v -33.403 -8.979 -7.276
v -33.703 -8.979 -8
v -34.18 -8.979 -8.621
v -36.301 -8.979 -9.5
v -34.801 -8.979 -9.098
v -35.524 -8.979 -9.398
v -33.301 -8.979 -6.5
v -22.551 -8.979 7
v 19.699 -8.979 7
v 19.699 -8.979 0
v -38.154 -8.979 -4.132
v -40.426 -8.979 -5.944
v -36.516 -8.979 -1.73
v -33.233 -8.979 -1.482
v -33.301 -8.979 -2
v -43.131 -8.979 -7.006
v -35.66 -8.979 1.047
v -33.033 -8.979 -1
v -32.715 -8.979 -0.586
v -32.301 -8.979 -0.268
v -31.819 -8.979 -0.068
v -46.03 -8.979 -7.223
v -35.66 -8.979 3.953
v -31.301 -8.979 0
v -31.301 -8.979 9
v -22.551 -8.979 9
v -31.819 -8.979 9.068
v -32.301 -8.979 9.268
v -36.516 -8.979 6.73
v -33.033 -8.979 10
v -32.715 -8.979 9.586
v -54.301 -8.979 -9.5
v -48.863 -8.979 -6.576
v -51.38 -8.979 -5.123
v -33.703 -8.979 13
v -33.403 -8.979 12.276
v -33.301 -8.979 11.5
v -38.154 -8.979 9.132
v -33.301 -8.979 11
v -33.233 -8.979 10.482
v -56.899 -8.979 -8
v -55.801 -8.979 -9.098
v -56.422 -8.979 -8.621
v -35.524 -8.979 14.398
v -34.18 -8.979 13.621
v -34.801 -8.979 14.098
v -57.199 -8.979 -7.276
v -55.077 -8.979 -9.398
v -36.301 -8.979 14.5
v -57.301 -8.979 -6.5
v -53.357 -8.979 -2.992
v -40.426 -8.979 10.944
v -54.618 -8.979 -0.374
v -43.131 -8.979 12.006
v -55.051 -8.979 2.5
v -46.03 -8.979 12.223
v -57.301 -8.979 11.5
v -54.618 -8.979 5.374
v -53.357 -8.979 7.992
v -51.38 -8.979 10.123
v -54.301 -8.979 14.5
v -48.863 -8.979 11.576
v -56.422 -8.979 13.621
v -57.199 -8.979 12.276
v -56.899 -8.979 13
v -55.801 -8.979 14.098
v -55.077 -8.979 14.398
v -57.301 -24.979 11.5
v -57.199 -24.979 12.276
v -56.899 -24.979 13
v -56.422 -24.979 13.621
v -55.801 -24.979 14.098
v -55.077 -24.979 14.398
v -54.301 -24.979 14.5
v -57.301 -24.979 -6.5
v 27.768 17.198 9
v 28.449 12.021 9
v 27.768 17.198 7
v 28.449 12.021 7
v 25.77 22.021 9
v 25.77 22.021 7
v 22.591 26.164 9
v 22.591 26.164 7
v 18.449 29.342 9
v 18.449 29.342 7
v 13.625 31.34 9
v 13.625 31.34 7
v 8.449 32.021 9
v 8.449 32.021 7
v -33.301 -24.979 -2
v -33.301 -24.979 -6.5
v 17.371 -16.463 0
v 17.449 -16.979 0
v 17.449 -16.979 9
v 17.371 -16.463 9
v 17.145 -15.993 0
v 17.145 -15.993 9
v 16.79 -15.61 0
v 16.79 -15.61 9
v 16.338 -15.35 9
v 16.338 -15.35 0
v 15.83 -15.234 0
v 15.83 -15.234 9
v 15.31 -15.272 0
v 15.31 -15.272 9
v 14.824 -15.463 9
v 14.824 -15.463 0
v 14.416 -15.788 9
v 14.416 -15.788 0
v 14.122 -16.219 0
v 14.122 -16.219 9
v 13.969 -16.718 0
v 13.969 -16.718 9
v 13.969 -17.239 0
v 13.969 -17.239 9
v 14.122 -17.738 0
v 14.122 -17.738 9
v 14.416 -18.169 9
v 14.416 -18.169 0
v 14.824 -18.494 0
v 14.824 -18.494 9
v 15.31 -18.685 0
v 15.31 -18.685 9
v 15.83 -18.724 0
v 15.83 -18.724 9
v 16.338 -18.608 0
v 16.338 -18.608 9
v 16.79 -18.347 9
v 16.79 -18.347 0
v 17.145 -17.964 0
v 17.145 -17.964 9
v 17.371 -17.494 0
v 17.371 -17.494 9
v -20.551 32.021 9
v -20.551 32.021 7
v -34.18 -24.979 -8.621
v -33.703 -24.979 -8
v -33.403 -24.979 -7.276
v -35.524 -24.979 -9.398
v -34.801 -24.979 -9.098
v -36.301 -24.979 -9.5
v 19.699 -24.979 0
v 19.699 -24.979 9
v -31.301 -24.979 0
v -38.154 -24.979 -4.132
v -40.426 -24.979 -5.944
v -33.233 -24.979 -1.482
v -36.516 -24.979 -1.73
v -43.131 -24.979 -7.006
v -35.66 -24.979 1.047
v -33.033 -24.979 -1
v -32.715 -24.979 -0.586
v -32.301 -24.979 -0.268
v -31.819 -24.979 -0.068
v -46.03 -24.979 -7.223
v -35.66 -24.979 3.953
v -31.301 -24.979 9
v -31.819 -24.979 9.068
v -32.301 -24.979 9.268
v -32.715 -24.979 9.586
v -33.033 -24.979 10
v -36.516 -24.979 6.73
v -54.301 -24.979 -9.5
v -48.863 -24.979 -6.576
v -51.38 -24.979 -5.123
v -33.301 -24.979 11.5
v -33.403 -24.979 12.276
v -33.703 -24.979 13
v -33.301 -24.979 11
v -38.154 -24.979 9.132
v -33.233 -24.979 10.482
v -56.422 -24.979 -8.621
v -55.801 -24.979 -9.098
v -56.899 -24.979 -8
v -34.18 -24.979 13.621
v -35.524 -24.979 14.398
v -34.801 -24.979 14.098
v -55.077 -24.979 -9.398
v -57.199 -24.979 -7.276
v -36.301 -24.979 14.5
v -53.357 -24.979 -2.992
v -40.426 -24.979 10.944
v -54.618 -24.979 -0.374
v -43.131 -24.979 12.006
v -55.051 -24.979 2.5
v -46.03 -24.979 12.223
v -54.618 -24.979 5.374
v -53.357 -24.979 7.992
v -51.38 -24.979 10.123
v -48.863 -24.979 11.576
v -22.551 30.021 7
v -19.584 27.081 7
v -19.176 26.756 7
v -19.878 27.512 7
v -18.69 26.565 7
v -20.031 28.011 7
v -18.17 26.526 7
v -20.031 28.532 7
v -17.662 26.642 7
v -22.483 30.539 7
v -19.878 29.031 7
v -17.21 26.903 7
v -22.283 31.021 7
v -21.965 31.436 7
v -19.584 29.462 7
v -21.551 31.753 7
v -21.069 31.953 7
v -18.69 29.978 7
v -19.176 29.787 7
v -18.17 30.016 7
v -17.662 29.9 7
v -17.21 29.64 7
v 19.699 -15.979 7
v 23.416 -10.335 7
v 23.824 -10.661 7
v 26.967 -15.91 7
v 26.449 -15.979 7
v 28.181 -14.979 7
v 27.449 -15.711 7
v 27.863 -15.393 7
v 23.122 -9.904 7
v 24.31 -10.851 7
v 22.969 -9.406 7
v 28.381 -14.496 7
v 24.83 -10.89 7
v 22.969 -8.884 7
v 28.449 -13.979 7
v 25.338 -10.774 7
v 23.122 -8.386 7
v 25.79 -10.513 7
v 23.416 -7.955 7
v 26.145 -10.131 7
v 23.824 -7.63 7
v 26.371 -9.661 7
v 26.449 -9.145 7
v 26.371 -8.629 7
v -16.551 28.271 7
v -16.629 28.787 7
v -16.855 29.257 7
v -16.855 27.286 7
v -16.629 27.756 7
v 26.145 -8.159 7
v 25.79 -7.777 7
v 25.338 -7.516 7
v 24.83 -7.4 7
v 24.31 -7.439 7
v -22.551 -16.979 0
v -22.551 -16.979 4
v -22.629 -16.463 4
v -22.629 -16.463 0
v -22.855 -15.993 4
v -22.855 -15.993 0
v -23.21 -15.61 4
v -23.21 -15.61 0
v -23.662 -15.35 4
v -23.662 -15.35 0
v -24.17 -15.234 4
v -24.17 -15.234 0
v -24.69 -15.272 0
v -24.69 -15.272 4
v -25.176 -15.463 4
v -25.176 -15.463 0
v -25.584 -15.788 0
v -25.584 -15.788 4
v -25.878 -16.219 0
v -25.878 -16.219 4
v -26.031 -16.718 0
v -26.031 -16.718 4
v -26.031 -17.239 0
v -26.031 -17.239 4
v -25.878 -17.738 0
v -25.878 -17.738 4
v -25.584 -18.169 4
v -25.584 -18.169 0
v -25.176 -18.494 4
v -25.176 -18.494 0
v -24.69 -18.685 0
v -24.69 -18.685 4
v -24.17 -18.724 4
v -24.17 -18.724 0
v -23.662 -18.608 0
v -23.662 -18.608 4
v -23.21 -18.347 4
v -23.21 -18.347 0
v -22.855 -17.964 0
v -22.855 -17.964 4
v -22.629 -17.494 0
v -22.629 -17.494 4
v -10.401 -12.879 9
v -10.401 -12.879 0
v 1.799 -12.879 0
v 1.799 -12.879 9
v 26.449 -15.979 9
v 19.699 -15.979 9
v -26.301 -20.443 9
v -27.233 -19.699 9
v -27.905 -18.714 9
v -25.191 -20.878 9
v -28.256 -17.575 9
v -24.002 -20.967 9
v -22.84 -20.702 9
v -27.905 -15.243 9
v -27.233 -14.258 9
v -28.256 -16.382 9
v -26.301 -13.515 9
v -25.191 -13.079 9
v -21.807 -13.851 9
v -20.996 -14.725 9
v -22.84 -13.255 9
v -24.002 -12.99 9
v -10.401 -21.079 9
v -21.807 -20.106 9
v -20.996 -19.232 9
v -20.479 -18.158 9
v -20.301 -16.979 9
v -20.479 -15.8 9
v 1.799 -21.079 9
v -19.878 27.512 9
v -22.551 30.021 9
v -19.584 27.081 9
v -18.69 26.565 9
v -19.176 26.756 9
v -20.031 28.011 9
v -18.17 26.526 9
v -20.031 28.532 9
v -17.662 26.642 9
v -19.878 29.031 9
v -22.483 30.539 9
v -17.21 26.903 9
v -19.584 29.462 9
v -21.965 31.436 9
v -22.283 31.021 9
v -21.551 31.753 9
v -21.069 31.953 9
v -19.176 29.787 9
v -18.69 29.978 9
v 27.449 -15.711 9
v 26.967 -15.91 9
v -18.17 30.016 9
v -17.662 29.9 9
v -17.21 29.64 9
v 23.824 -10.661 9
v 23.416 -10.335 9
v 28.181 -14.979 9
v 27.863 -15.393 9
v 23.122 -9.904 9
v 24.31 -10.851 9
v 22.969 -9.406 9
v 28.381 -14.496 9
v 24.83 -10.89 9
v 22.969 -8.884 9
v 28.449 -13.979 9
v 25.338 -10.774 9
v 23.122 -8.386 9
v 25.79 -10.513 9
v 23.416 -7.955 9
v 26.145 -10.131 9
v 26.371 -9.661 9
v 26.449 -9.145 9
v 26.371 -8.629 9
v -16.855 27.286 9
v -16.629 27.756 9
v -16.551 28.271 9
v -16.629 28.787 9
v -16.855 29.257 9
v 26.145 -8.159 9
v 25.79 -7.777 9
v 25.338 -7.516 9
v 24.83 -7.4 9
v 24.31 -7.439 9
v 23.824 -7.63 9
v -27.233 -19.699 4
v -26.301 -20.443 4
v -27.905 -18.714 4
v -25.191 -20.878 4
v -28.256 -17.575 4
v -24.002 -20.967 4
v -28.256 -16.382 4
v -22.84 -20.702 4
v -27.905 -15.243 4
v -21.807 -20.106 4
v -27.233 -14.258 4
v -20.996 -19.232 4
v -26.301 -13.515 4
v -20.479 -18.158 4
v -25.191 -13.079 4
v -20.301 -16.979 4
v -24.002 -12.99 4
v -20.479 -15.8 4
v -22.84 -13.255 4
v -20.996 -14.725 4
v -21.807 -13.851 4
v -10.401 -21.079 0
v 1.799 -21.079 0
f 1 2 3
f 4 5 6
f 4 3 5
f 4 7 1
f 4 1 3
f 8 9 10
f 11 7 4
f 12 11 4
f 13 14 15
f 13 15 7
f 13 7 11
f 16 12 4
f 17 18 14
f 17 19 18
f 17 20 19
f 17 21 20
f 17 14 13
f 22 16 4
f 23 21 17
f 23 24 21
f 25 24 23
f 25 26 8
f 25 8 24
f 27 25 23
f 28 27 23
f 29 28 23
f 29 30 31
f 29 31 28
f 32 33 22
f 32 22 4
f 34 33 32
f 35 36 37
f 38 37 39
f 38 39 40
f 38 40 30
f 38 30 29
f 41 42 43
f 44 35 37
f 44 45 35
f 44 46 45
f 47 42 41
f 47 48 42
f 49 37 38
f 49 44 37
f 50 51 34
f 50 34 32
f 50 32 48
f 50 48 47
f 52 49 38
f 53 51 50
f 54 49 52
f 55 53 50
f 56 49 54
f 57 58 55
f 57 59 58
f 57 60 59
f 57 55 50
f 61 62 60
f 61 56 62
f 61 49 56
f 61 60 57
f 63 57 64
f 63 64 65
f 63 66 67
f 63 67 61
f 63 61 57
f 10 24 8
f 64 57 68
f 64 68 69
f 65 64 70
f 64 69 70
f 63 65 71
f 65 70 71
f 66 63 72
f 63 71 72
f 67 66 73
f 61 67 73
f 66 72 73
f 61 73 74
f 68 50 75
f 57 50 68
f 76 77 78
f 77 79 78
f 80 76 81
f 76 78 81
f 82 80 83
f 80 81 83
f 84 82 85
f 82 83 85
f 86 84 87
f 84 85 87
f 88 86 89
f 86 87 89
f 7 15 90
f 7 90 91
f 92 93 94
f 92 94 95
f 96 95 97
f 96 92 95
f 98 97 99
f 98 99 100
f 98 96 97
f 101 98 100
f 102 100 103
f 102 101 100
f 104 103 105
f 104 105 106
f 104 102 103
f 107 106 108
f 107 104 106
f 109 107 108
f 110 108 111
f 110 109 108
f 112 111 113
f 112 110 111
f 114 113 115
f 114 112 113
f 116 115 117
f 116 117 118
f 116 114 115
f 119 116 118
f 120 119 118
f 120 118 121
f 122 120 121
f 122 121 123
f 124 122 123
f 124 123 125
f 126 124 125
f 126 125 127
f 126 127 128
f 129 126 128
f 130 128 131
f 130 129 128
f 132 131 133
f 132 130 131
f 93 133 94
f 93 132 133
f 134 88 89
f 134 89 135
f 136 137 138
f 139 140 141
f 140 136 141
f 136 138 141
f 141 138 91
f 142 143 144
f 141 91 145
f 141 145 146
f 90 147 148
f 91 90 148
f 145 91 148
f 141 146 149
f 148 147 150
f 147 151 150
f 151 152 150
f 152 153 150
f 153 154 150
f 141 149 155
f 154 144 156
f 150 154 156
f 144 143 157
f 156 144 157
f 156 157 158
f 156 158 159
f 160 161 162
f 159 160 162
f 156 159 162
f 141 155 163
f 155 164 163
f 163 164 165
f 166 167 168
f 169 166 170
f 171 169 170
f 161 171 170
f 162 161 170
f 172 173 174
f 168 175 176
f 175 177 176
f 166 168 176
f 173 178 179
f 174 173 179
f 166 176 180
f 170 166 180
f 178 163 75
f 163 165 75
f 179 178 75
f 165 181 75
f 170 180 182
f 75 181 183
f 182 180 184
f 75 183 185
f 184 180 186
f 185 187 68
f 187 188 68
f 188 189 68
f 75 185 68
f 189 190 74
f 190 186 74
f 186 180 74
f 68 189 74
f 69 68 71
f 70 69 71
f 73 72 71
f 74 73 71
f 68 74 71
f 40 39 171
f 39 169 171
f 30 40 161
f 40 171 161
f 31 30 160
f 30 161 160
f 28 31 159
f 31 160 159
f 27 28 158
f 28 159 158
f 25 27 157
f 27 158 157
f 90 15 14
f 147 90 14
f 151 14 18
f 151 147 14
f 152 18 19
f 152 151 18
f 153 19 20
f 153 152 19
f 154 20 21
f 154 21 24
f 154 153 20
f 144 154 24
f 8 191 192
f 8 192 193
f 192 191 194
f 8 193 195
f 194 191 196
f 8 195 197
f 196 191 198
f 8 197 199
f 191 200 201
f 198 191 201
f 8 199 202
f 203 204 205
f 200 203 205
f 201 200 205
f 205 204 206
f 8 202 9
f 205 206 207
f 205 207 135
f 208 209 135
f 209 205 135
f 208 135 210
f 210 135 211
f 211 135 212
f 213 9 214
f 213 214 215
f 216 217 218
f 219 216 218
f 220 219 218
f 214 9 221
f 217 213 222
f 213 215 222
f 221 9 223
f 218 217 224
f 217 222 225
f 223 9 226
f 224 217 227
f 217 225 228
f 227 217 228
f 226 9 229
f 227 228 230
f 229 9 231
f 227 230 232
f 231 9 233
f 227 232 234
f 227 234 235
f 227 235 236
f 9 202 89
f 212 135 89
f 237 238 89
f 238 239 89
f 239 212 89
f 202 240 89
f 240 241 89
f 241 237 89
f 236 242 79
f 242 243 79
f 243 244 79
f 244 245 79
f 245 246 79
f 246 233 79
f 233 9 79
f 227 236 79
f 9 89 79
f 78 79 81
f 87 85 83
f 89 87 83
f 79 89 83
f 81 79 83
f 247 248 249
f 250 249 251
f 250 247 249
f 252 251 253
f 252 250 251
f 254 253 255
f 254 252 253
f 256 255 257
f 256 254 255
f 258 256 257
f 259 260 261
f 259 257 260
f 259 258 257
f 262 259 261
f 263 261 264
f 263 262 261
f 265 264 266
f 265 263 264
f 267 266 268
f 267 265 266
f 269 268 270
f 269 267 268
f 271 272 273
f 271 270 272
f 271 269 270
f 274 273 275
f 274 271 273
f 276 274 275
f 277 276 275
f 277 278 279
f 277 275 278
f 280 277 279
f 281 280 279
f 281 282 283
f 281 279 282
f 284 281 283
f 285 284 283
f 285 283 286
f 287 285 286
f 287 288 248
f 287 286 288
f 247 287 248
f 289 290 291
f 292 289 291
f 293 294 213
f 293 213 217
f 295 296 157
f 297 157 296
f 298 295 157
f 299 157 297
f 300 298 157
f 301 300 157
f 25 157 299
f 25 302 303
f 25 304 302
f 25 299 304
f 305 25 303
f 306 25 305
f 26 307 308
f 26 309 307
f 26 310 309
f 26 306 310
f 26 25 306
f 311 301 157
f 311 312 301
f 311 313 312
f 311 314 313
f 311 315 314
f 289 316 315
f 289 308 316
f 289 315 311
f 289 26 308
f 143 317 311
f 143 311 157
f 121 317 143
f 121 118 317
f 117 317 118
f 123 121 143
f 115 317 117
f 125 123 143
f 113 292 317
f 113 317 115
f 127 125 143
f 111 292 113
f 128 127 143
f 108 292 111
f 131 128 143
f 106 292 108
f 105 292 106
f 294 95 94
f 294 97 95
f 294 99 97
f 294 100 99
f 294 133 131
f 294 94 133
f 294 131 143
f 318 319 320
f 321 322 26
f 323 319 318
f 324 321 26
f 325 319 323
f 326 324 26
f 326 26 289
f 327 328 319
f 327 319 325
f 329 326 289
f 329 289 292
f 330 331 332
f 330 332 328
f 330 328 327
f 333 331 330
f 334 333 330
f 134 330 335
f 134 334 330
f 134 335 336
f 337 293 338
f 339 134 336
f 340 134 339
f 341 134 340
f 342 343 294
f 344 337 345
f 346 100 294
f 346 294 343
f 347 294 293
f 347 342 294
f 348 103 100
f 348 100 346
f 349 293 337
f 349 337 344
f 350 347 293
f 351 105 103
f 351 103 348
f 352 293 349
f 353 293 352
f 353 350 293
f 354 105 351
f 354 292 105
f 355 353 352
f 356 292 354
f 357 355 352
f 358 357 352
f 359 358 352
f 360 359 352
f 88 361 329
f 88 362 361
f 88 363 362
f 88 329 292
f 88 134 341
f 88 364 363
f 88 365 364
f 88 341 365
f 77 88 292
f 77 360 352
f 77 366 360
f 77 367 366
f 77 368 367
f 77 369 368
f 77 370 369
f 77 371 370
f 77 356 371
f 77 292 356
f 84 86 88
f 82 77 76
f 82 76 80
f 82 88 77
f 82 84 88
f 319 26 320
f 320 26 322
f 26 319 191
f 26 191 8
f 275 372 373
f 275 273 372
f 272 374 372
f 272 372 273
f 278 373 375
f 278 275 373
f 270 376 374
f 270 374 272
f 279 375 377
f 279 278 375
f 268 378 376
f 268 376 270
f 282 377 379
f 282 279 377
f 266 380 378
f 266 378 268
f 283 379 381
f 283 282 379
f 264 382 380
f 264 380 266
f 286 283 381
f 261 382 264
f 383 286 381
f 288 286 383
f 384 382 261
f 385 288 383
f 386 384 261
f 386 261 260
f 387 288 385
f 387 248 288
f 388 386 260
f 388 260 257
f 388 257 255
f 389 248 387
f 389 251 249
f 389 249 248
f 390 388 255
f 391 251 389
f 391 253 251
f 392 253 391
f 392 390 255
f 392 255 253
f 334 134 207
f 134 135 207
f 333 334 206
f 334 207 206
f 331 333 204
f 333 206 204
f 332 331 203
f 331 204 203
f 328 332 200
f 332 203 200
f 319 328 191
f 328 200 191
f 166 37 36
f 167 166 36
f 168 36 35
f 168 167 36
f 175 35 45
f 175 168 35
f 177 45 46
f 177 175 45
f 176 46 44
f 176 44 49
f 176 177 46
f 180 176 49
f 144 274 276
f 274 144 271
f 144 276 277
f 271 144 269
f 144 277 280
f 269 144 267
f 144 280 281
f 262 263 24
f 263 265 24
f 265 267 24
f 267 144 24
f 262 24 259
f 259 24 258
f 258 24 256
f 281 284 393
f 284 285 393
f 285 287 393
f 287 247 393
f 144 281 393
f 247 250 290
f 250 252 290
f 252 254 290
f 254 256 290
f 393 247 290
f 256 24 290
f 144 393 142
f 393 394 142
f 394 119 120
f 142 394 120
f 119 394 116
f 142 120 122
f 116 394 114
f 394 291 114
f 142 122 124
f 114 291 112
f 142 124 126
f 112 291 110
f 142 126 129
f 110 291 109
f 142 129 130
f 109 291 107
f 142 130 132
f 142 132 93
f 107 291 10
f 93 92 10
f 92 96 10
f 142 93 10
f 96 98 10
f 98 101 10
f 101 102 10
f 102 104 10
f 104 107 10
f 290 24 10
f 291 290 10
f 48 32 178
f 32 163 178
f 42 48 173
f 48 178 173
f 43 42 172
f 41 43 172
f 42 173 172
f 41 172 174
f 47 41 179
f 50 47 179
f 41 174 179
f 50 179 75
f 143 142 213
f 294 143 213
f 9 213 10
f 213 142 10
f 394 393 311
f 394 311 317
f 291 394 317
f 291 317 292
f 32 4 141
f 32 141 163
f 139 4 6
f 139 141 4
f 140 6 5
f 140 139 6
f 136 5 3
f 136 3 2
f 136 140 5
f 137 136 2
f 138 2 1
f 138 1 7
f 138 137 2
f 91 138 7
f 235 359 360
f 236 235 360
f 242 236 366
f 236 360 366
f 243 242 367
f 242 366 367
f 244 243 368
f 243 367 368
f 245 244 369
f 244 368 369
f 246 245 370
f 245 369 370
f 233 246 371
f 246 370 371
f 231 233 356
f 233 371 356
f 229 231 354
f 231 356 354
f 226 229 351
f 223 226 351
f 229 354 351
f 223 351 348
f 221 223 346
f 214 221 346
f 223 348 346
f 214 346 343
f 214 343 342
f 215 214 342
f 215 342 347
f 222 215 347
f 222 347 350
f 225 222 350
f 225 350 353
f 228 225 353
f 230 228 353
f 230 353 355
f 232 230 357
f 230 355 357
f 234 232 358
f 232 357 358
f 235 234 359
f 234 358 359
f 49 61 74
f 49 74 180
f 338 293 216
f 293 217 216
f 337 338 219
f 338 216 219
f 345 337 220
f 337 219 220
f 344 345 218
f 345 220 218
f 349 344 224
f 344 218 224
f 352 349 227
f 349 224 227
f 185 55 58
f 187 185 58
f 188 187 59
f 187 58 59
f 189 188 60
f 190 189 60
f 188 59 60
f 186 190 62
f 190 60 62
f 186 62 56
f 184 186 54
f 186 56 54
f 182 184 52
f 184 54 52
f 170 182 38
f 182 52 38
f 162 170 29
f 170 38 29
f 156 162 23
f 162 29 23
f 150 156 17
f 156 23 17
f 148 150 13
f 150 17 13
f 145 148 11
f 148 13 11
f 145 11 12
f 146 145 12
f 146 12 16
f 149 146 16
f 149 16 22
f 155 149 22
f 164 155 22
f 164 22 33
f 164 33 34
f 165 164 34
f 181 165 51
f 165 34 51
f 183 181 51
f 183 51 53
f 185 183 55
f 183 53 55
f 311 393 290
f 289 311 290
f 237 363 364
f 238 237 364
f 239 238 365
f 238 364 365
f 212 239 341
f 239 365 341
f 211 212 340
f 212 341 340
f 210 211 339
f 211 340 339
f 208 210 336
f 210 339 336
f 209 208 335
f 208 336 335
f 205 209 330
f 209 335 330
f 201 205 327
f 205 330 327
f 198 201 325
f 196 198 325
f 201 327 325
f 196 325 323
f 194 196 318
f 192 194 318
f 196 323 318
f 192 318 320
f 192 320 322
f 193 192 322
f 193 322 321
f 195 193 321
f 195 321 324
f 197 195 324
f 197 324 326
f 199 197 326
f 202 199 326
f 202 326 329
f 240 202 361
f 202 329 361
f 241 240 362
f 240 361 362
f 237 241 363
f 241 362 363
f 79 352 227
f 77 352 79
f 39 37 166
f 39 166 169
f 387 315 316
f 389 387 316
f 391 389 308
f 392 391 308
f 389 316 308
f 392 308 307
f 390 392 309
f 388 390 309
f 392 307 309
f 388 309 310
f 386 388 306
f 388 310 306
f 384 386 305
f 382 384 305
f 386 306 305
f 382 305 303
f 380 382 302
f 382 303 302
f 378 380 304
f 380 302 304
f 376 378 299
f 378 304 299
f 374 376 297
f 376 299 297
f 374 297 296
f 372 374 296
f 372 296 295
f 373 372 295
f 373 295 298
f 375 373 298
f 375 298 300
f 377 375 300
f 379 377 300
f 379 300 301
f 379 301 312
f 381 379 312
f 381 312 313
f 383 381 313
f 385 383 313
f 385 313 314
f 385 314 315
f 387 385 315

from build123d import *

# Parameters (mm, degrees)
F0_R            = 1.75
F0_W            = 12.2
F0_H            = 8.2
F1_DEPTH        = 9
F2_R            = 9.75
F3_DEPTH        = 16
F4_R            = 3
F6_R            = 2
F7_R            = 1.75
F8_DEPTH        = 2
F9_DEPTH        = 2
F10_R           = 2
F11_R           = 20
F13_D           = 3.5
F13_CBORE_D     = 8
F13_CBORE_DEPTH = 5


with BuildPart() as f1:
    # F0 (on Top) → F1 (new body)
    with BuildSketch(Plane.XY):
        Polygon((19.6991001874, -8.9786109865), (-33.3008998126, -8.9786109865), (-33.3008998126, -24.9786109865), (-24.3008998126, -24.9786109865), (19.6991001874, -24.9786109865), align=None)
        with Locations((-24.3008998126, -16.9786109865)):
            Circle(F0_R, mode=Mode.SUBTRACT)
        with Locations((-4.3008998126, -16.9786109865)):
            Rectangle(F0_W, F0_H, mode=Mode.SUBTRACT)
        with Locations((15.6991001874, -16.9786109865)):
            Circle(F0_R, mode=Mode.SUBTRACT)
    extrude(amount=F1_DEPTH)


with BuildPart() as f3:
    # F2 (on face) → F3 (new body)
    with BuildSketch(Plane(origin=(0, -8.9786109865, 0), x_dir=(-1, 0, 0), z_dir=(0, 1, 0))):
        Polygon((33.3008998126, 9), (33.3008998126, 0), (33.3008998126, -9.5), (57.3008998126, -9.5), (57.3008998126, 14.5), (33.3008998126, 14.5), align=None)
        with Locations((45.3008998126, 2.5)):
            Circle(F2_R, mode=Mode.SUBTRACT)
    extrude(amount=-F3_DEPTH)

    # F4
    f4_edges = [f3.edges().sort_by_distance(p)[0] for p in [
        (-33.3009, -16.978611, 14.5),
        (-57.3009, -16.978611, 14.5),
        (-57.3009, -16.978611, -9.5),
        (-33.3009, -16.978611, -9.5),
    ]]
    fillet(f4_edges, radius=F4_R)


with BuildPart() as f1_1:
    add(f1.part)

    # F5: union F3
    add(f3.part)

    # F6
    f6_edges = [f1_1.edges().sort_by_distance(p)[0] for p in [
        (-33.3009, -16.978611, 0),
        (-33.3009, -16.978611, 9),
    ]]
    fillet(f6_edges, radius=F6_R)

    # F7 (on face) → F8 (join)
    with BuildSketch(Plane.XY.offset(9)):
        Polygon((19.6991001874, -8.9786109865), (19.6991001874, -15.9786109865), (28.4491001874, -15.9786109865), (28.4491001874, 32.0213890135), (-22.5508998126, 32.0213890135), (-22.5508998126, -8.9786109865), align=None)
        with Locations((24.6991001874, -9.1451848542)):
            Circle(F7_R, mode=Mode.SUBTRACT)
        with Locations((-18.3008998126, 28.2713890135)):
            Circle(F7_R, mode=Mode.SUBTRACT)
        with Locations((-18.3008998126, 28.2713890135)):
            Circle(F7_R)
        with Locations((24.6991001874, -9.1451848542)):
            Circle(F7_R)
    extrude(amount=-F8_DEPTH)

    # F7 (on face) → F9 (cut, through all)
    with BuildSketch(Plane.XY.offset(9)):
        with Locations((-18.3008998126, 28.2713890135)):
            Circle(F7_R)
        with Locations((24.6991001874, -9.1451848542)):
            Circle(F7_R)
    extrude(amount=-F9_DEPTH, mode=Mode.SUBTRACT)

    # F10
    f10_edges = [f1_1.edges().sort_by_distance(p)[0] for p in [
        (-22.5509, 32.021389, 8),
        (28.4491, -15.978611, 8),
    ]]
    fillet(f10_edges, radius=F10_R)

    # F11
    f11_edges = [f1_1.edges().sort_by_distance(p)[0] for p in [
        (28.4491, 32.021389, 8),
    ]]
    fillet(f11_edges, radius=F11_R)

    # F13 (through all)
    with Locations(Plane.XY.offset(9)):
        with Locations((-24.3008998126, -16.9786109865)):
            CounterBoreHole(F13_D / 2, F13_CBORE_D / 2, F13_CBORE_DEPTH)


solid = f1_1.part
